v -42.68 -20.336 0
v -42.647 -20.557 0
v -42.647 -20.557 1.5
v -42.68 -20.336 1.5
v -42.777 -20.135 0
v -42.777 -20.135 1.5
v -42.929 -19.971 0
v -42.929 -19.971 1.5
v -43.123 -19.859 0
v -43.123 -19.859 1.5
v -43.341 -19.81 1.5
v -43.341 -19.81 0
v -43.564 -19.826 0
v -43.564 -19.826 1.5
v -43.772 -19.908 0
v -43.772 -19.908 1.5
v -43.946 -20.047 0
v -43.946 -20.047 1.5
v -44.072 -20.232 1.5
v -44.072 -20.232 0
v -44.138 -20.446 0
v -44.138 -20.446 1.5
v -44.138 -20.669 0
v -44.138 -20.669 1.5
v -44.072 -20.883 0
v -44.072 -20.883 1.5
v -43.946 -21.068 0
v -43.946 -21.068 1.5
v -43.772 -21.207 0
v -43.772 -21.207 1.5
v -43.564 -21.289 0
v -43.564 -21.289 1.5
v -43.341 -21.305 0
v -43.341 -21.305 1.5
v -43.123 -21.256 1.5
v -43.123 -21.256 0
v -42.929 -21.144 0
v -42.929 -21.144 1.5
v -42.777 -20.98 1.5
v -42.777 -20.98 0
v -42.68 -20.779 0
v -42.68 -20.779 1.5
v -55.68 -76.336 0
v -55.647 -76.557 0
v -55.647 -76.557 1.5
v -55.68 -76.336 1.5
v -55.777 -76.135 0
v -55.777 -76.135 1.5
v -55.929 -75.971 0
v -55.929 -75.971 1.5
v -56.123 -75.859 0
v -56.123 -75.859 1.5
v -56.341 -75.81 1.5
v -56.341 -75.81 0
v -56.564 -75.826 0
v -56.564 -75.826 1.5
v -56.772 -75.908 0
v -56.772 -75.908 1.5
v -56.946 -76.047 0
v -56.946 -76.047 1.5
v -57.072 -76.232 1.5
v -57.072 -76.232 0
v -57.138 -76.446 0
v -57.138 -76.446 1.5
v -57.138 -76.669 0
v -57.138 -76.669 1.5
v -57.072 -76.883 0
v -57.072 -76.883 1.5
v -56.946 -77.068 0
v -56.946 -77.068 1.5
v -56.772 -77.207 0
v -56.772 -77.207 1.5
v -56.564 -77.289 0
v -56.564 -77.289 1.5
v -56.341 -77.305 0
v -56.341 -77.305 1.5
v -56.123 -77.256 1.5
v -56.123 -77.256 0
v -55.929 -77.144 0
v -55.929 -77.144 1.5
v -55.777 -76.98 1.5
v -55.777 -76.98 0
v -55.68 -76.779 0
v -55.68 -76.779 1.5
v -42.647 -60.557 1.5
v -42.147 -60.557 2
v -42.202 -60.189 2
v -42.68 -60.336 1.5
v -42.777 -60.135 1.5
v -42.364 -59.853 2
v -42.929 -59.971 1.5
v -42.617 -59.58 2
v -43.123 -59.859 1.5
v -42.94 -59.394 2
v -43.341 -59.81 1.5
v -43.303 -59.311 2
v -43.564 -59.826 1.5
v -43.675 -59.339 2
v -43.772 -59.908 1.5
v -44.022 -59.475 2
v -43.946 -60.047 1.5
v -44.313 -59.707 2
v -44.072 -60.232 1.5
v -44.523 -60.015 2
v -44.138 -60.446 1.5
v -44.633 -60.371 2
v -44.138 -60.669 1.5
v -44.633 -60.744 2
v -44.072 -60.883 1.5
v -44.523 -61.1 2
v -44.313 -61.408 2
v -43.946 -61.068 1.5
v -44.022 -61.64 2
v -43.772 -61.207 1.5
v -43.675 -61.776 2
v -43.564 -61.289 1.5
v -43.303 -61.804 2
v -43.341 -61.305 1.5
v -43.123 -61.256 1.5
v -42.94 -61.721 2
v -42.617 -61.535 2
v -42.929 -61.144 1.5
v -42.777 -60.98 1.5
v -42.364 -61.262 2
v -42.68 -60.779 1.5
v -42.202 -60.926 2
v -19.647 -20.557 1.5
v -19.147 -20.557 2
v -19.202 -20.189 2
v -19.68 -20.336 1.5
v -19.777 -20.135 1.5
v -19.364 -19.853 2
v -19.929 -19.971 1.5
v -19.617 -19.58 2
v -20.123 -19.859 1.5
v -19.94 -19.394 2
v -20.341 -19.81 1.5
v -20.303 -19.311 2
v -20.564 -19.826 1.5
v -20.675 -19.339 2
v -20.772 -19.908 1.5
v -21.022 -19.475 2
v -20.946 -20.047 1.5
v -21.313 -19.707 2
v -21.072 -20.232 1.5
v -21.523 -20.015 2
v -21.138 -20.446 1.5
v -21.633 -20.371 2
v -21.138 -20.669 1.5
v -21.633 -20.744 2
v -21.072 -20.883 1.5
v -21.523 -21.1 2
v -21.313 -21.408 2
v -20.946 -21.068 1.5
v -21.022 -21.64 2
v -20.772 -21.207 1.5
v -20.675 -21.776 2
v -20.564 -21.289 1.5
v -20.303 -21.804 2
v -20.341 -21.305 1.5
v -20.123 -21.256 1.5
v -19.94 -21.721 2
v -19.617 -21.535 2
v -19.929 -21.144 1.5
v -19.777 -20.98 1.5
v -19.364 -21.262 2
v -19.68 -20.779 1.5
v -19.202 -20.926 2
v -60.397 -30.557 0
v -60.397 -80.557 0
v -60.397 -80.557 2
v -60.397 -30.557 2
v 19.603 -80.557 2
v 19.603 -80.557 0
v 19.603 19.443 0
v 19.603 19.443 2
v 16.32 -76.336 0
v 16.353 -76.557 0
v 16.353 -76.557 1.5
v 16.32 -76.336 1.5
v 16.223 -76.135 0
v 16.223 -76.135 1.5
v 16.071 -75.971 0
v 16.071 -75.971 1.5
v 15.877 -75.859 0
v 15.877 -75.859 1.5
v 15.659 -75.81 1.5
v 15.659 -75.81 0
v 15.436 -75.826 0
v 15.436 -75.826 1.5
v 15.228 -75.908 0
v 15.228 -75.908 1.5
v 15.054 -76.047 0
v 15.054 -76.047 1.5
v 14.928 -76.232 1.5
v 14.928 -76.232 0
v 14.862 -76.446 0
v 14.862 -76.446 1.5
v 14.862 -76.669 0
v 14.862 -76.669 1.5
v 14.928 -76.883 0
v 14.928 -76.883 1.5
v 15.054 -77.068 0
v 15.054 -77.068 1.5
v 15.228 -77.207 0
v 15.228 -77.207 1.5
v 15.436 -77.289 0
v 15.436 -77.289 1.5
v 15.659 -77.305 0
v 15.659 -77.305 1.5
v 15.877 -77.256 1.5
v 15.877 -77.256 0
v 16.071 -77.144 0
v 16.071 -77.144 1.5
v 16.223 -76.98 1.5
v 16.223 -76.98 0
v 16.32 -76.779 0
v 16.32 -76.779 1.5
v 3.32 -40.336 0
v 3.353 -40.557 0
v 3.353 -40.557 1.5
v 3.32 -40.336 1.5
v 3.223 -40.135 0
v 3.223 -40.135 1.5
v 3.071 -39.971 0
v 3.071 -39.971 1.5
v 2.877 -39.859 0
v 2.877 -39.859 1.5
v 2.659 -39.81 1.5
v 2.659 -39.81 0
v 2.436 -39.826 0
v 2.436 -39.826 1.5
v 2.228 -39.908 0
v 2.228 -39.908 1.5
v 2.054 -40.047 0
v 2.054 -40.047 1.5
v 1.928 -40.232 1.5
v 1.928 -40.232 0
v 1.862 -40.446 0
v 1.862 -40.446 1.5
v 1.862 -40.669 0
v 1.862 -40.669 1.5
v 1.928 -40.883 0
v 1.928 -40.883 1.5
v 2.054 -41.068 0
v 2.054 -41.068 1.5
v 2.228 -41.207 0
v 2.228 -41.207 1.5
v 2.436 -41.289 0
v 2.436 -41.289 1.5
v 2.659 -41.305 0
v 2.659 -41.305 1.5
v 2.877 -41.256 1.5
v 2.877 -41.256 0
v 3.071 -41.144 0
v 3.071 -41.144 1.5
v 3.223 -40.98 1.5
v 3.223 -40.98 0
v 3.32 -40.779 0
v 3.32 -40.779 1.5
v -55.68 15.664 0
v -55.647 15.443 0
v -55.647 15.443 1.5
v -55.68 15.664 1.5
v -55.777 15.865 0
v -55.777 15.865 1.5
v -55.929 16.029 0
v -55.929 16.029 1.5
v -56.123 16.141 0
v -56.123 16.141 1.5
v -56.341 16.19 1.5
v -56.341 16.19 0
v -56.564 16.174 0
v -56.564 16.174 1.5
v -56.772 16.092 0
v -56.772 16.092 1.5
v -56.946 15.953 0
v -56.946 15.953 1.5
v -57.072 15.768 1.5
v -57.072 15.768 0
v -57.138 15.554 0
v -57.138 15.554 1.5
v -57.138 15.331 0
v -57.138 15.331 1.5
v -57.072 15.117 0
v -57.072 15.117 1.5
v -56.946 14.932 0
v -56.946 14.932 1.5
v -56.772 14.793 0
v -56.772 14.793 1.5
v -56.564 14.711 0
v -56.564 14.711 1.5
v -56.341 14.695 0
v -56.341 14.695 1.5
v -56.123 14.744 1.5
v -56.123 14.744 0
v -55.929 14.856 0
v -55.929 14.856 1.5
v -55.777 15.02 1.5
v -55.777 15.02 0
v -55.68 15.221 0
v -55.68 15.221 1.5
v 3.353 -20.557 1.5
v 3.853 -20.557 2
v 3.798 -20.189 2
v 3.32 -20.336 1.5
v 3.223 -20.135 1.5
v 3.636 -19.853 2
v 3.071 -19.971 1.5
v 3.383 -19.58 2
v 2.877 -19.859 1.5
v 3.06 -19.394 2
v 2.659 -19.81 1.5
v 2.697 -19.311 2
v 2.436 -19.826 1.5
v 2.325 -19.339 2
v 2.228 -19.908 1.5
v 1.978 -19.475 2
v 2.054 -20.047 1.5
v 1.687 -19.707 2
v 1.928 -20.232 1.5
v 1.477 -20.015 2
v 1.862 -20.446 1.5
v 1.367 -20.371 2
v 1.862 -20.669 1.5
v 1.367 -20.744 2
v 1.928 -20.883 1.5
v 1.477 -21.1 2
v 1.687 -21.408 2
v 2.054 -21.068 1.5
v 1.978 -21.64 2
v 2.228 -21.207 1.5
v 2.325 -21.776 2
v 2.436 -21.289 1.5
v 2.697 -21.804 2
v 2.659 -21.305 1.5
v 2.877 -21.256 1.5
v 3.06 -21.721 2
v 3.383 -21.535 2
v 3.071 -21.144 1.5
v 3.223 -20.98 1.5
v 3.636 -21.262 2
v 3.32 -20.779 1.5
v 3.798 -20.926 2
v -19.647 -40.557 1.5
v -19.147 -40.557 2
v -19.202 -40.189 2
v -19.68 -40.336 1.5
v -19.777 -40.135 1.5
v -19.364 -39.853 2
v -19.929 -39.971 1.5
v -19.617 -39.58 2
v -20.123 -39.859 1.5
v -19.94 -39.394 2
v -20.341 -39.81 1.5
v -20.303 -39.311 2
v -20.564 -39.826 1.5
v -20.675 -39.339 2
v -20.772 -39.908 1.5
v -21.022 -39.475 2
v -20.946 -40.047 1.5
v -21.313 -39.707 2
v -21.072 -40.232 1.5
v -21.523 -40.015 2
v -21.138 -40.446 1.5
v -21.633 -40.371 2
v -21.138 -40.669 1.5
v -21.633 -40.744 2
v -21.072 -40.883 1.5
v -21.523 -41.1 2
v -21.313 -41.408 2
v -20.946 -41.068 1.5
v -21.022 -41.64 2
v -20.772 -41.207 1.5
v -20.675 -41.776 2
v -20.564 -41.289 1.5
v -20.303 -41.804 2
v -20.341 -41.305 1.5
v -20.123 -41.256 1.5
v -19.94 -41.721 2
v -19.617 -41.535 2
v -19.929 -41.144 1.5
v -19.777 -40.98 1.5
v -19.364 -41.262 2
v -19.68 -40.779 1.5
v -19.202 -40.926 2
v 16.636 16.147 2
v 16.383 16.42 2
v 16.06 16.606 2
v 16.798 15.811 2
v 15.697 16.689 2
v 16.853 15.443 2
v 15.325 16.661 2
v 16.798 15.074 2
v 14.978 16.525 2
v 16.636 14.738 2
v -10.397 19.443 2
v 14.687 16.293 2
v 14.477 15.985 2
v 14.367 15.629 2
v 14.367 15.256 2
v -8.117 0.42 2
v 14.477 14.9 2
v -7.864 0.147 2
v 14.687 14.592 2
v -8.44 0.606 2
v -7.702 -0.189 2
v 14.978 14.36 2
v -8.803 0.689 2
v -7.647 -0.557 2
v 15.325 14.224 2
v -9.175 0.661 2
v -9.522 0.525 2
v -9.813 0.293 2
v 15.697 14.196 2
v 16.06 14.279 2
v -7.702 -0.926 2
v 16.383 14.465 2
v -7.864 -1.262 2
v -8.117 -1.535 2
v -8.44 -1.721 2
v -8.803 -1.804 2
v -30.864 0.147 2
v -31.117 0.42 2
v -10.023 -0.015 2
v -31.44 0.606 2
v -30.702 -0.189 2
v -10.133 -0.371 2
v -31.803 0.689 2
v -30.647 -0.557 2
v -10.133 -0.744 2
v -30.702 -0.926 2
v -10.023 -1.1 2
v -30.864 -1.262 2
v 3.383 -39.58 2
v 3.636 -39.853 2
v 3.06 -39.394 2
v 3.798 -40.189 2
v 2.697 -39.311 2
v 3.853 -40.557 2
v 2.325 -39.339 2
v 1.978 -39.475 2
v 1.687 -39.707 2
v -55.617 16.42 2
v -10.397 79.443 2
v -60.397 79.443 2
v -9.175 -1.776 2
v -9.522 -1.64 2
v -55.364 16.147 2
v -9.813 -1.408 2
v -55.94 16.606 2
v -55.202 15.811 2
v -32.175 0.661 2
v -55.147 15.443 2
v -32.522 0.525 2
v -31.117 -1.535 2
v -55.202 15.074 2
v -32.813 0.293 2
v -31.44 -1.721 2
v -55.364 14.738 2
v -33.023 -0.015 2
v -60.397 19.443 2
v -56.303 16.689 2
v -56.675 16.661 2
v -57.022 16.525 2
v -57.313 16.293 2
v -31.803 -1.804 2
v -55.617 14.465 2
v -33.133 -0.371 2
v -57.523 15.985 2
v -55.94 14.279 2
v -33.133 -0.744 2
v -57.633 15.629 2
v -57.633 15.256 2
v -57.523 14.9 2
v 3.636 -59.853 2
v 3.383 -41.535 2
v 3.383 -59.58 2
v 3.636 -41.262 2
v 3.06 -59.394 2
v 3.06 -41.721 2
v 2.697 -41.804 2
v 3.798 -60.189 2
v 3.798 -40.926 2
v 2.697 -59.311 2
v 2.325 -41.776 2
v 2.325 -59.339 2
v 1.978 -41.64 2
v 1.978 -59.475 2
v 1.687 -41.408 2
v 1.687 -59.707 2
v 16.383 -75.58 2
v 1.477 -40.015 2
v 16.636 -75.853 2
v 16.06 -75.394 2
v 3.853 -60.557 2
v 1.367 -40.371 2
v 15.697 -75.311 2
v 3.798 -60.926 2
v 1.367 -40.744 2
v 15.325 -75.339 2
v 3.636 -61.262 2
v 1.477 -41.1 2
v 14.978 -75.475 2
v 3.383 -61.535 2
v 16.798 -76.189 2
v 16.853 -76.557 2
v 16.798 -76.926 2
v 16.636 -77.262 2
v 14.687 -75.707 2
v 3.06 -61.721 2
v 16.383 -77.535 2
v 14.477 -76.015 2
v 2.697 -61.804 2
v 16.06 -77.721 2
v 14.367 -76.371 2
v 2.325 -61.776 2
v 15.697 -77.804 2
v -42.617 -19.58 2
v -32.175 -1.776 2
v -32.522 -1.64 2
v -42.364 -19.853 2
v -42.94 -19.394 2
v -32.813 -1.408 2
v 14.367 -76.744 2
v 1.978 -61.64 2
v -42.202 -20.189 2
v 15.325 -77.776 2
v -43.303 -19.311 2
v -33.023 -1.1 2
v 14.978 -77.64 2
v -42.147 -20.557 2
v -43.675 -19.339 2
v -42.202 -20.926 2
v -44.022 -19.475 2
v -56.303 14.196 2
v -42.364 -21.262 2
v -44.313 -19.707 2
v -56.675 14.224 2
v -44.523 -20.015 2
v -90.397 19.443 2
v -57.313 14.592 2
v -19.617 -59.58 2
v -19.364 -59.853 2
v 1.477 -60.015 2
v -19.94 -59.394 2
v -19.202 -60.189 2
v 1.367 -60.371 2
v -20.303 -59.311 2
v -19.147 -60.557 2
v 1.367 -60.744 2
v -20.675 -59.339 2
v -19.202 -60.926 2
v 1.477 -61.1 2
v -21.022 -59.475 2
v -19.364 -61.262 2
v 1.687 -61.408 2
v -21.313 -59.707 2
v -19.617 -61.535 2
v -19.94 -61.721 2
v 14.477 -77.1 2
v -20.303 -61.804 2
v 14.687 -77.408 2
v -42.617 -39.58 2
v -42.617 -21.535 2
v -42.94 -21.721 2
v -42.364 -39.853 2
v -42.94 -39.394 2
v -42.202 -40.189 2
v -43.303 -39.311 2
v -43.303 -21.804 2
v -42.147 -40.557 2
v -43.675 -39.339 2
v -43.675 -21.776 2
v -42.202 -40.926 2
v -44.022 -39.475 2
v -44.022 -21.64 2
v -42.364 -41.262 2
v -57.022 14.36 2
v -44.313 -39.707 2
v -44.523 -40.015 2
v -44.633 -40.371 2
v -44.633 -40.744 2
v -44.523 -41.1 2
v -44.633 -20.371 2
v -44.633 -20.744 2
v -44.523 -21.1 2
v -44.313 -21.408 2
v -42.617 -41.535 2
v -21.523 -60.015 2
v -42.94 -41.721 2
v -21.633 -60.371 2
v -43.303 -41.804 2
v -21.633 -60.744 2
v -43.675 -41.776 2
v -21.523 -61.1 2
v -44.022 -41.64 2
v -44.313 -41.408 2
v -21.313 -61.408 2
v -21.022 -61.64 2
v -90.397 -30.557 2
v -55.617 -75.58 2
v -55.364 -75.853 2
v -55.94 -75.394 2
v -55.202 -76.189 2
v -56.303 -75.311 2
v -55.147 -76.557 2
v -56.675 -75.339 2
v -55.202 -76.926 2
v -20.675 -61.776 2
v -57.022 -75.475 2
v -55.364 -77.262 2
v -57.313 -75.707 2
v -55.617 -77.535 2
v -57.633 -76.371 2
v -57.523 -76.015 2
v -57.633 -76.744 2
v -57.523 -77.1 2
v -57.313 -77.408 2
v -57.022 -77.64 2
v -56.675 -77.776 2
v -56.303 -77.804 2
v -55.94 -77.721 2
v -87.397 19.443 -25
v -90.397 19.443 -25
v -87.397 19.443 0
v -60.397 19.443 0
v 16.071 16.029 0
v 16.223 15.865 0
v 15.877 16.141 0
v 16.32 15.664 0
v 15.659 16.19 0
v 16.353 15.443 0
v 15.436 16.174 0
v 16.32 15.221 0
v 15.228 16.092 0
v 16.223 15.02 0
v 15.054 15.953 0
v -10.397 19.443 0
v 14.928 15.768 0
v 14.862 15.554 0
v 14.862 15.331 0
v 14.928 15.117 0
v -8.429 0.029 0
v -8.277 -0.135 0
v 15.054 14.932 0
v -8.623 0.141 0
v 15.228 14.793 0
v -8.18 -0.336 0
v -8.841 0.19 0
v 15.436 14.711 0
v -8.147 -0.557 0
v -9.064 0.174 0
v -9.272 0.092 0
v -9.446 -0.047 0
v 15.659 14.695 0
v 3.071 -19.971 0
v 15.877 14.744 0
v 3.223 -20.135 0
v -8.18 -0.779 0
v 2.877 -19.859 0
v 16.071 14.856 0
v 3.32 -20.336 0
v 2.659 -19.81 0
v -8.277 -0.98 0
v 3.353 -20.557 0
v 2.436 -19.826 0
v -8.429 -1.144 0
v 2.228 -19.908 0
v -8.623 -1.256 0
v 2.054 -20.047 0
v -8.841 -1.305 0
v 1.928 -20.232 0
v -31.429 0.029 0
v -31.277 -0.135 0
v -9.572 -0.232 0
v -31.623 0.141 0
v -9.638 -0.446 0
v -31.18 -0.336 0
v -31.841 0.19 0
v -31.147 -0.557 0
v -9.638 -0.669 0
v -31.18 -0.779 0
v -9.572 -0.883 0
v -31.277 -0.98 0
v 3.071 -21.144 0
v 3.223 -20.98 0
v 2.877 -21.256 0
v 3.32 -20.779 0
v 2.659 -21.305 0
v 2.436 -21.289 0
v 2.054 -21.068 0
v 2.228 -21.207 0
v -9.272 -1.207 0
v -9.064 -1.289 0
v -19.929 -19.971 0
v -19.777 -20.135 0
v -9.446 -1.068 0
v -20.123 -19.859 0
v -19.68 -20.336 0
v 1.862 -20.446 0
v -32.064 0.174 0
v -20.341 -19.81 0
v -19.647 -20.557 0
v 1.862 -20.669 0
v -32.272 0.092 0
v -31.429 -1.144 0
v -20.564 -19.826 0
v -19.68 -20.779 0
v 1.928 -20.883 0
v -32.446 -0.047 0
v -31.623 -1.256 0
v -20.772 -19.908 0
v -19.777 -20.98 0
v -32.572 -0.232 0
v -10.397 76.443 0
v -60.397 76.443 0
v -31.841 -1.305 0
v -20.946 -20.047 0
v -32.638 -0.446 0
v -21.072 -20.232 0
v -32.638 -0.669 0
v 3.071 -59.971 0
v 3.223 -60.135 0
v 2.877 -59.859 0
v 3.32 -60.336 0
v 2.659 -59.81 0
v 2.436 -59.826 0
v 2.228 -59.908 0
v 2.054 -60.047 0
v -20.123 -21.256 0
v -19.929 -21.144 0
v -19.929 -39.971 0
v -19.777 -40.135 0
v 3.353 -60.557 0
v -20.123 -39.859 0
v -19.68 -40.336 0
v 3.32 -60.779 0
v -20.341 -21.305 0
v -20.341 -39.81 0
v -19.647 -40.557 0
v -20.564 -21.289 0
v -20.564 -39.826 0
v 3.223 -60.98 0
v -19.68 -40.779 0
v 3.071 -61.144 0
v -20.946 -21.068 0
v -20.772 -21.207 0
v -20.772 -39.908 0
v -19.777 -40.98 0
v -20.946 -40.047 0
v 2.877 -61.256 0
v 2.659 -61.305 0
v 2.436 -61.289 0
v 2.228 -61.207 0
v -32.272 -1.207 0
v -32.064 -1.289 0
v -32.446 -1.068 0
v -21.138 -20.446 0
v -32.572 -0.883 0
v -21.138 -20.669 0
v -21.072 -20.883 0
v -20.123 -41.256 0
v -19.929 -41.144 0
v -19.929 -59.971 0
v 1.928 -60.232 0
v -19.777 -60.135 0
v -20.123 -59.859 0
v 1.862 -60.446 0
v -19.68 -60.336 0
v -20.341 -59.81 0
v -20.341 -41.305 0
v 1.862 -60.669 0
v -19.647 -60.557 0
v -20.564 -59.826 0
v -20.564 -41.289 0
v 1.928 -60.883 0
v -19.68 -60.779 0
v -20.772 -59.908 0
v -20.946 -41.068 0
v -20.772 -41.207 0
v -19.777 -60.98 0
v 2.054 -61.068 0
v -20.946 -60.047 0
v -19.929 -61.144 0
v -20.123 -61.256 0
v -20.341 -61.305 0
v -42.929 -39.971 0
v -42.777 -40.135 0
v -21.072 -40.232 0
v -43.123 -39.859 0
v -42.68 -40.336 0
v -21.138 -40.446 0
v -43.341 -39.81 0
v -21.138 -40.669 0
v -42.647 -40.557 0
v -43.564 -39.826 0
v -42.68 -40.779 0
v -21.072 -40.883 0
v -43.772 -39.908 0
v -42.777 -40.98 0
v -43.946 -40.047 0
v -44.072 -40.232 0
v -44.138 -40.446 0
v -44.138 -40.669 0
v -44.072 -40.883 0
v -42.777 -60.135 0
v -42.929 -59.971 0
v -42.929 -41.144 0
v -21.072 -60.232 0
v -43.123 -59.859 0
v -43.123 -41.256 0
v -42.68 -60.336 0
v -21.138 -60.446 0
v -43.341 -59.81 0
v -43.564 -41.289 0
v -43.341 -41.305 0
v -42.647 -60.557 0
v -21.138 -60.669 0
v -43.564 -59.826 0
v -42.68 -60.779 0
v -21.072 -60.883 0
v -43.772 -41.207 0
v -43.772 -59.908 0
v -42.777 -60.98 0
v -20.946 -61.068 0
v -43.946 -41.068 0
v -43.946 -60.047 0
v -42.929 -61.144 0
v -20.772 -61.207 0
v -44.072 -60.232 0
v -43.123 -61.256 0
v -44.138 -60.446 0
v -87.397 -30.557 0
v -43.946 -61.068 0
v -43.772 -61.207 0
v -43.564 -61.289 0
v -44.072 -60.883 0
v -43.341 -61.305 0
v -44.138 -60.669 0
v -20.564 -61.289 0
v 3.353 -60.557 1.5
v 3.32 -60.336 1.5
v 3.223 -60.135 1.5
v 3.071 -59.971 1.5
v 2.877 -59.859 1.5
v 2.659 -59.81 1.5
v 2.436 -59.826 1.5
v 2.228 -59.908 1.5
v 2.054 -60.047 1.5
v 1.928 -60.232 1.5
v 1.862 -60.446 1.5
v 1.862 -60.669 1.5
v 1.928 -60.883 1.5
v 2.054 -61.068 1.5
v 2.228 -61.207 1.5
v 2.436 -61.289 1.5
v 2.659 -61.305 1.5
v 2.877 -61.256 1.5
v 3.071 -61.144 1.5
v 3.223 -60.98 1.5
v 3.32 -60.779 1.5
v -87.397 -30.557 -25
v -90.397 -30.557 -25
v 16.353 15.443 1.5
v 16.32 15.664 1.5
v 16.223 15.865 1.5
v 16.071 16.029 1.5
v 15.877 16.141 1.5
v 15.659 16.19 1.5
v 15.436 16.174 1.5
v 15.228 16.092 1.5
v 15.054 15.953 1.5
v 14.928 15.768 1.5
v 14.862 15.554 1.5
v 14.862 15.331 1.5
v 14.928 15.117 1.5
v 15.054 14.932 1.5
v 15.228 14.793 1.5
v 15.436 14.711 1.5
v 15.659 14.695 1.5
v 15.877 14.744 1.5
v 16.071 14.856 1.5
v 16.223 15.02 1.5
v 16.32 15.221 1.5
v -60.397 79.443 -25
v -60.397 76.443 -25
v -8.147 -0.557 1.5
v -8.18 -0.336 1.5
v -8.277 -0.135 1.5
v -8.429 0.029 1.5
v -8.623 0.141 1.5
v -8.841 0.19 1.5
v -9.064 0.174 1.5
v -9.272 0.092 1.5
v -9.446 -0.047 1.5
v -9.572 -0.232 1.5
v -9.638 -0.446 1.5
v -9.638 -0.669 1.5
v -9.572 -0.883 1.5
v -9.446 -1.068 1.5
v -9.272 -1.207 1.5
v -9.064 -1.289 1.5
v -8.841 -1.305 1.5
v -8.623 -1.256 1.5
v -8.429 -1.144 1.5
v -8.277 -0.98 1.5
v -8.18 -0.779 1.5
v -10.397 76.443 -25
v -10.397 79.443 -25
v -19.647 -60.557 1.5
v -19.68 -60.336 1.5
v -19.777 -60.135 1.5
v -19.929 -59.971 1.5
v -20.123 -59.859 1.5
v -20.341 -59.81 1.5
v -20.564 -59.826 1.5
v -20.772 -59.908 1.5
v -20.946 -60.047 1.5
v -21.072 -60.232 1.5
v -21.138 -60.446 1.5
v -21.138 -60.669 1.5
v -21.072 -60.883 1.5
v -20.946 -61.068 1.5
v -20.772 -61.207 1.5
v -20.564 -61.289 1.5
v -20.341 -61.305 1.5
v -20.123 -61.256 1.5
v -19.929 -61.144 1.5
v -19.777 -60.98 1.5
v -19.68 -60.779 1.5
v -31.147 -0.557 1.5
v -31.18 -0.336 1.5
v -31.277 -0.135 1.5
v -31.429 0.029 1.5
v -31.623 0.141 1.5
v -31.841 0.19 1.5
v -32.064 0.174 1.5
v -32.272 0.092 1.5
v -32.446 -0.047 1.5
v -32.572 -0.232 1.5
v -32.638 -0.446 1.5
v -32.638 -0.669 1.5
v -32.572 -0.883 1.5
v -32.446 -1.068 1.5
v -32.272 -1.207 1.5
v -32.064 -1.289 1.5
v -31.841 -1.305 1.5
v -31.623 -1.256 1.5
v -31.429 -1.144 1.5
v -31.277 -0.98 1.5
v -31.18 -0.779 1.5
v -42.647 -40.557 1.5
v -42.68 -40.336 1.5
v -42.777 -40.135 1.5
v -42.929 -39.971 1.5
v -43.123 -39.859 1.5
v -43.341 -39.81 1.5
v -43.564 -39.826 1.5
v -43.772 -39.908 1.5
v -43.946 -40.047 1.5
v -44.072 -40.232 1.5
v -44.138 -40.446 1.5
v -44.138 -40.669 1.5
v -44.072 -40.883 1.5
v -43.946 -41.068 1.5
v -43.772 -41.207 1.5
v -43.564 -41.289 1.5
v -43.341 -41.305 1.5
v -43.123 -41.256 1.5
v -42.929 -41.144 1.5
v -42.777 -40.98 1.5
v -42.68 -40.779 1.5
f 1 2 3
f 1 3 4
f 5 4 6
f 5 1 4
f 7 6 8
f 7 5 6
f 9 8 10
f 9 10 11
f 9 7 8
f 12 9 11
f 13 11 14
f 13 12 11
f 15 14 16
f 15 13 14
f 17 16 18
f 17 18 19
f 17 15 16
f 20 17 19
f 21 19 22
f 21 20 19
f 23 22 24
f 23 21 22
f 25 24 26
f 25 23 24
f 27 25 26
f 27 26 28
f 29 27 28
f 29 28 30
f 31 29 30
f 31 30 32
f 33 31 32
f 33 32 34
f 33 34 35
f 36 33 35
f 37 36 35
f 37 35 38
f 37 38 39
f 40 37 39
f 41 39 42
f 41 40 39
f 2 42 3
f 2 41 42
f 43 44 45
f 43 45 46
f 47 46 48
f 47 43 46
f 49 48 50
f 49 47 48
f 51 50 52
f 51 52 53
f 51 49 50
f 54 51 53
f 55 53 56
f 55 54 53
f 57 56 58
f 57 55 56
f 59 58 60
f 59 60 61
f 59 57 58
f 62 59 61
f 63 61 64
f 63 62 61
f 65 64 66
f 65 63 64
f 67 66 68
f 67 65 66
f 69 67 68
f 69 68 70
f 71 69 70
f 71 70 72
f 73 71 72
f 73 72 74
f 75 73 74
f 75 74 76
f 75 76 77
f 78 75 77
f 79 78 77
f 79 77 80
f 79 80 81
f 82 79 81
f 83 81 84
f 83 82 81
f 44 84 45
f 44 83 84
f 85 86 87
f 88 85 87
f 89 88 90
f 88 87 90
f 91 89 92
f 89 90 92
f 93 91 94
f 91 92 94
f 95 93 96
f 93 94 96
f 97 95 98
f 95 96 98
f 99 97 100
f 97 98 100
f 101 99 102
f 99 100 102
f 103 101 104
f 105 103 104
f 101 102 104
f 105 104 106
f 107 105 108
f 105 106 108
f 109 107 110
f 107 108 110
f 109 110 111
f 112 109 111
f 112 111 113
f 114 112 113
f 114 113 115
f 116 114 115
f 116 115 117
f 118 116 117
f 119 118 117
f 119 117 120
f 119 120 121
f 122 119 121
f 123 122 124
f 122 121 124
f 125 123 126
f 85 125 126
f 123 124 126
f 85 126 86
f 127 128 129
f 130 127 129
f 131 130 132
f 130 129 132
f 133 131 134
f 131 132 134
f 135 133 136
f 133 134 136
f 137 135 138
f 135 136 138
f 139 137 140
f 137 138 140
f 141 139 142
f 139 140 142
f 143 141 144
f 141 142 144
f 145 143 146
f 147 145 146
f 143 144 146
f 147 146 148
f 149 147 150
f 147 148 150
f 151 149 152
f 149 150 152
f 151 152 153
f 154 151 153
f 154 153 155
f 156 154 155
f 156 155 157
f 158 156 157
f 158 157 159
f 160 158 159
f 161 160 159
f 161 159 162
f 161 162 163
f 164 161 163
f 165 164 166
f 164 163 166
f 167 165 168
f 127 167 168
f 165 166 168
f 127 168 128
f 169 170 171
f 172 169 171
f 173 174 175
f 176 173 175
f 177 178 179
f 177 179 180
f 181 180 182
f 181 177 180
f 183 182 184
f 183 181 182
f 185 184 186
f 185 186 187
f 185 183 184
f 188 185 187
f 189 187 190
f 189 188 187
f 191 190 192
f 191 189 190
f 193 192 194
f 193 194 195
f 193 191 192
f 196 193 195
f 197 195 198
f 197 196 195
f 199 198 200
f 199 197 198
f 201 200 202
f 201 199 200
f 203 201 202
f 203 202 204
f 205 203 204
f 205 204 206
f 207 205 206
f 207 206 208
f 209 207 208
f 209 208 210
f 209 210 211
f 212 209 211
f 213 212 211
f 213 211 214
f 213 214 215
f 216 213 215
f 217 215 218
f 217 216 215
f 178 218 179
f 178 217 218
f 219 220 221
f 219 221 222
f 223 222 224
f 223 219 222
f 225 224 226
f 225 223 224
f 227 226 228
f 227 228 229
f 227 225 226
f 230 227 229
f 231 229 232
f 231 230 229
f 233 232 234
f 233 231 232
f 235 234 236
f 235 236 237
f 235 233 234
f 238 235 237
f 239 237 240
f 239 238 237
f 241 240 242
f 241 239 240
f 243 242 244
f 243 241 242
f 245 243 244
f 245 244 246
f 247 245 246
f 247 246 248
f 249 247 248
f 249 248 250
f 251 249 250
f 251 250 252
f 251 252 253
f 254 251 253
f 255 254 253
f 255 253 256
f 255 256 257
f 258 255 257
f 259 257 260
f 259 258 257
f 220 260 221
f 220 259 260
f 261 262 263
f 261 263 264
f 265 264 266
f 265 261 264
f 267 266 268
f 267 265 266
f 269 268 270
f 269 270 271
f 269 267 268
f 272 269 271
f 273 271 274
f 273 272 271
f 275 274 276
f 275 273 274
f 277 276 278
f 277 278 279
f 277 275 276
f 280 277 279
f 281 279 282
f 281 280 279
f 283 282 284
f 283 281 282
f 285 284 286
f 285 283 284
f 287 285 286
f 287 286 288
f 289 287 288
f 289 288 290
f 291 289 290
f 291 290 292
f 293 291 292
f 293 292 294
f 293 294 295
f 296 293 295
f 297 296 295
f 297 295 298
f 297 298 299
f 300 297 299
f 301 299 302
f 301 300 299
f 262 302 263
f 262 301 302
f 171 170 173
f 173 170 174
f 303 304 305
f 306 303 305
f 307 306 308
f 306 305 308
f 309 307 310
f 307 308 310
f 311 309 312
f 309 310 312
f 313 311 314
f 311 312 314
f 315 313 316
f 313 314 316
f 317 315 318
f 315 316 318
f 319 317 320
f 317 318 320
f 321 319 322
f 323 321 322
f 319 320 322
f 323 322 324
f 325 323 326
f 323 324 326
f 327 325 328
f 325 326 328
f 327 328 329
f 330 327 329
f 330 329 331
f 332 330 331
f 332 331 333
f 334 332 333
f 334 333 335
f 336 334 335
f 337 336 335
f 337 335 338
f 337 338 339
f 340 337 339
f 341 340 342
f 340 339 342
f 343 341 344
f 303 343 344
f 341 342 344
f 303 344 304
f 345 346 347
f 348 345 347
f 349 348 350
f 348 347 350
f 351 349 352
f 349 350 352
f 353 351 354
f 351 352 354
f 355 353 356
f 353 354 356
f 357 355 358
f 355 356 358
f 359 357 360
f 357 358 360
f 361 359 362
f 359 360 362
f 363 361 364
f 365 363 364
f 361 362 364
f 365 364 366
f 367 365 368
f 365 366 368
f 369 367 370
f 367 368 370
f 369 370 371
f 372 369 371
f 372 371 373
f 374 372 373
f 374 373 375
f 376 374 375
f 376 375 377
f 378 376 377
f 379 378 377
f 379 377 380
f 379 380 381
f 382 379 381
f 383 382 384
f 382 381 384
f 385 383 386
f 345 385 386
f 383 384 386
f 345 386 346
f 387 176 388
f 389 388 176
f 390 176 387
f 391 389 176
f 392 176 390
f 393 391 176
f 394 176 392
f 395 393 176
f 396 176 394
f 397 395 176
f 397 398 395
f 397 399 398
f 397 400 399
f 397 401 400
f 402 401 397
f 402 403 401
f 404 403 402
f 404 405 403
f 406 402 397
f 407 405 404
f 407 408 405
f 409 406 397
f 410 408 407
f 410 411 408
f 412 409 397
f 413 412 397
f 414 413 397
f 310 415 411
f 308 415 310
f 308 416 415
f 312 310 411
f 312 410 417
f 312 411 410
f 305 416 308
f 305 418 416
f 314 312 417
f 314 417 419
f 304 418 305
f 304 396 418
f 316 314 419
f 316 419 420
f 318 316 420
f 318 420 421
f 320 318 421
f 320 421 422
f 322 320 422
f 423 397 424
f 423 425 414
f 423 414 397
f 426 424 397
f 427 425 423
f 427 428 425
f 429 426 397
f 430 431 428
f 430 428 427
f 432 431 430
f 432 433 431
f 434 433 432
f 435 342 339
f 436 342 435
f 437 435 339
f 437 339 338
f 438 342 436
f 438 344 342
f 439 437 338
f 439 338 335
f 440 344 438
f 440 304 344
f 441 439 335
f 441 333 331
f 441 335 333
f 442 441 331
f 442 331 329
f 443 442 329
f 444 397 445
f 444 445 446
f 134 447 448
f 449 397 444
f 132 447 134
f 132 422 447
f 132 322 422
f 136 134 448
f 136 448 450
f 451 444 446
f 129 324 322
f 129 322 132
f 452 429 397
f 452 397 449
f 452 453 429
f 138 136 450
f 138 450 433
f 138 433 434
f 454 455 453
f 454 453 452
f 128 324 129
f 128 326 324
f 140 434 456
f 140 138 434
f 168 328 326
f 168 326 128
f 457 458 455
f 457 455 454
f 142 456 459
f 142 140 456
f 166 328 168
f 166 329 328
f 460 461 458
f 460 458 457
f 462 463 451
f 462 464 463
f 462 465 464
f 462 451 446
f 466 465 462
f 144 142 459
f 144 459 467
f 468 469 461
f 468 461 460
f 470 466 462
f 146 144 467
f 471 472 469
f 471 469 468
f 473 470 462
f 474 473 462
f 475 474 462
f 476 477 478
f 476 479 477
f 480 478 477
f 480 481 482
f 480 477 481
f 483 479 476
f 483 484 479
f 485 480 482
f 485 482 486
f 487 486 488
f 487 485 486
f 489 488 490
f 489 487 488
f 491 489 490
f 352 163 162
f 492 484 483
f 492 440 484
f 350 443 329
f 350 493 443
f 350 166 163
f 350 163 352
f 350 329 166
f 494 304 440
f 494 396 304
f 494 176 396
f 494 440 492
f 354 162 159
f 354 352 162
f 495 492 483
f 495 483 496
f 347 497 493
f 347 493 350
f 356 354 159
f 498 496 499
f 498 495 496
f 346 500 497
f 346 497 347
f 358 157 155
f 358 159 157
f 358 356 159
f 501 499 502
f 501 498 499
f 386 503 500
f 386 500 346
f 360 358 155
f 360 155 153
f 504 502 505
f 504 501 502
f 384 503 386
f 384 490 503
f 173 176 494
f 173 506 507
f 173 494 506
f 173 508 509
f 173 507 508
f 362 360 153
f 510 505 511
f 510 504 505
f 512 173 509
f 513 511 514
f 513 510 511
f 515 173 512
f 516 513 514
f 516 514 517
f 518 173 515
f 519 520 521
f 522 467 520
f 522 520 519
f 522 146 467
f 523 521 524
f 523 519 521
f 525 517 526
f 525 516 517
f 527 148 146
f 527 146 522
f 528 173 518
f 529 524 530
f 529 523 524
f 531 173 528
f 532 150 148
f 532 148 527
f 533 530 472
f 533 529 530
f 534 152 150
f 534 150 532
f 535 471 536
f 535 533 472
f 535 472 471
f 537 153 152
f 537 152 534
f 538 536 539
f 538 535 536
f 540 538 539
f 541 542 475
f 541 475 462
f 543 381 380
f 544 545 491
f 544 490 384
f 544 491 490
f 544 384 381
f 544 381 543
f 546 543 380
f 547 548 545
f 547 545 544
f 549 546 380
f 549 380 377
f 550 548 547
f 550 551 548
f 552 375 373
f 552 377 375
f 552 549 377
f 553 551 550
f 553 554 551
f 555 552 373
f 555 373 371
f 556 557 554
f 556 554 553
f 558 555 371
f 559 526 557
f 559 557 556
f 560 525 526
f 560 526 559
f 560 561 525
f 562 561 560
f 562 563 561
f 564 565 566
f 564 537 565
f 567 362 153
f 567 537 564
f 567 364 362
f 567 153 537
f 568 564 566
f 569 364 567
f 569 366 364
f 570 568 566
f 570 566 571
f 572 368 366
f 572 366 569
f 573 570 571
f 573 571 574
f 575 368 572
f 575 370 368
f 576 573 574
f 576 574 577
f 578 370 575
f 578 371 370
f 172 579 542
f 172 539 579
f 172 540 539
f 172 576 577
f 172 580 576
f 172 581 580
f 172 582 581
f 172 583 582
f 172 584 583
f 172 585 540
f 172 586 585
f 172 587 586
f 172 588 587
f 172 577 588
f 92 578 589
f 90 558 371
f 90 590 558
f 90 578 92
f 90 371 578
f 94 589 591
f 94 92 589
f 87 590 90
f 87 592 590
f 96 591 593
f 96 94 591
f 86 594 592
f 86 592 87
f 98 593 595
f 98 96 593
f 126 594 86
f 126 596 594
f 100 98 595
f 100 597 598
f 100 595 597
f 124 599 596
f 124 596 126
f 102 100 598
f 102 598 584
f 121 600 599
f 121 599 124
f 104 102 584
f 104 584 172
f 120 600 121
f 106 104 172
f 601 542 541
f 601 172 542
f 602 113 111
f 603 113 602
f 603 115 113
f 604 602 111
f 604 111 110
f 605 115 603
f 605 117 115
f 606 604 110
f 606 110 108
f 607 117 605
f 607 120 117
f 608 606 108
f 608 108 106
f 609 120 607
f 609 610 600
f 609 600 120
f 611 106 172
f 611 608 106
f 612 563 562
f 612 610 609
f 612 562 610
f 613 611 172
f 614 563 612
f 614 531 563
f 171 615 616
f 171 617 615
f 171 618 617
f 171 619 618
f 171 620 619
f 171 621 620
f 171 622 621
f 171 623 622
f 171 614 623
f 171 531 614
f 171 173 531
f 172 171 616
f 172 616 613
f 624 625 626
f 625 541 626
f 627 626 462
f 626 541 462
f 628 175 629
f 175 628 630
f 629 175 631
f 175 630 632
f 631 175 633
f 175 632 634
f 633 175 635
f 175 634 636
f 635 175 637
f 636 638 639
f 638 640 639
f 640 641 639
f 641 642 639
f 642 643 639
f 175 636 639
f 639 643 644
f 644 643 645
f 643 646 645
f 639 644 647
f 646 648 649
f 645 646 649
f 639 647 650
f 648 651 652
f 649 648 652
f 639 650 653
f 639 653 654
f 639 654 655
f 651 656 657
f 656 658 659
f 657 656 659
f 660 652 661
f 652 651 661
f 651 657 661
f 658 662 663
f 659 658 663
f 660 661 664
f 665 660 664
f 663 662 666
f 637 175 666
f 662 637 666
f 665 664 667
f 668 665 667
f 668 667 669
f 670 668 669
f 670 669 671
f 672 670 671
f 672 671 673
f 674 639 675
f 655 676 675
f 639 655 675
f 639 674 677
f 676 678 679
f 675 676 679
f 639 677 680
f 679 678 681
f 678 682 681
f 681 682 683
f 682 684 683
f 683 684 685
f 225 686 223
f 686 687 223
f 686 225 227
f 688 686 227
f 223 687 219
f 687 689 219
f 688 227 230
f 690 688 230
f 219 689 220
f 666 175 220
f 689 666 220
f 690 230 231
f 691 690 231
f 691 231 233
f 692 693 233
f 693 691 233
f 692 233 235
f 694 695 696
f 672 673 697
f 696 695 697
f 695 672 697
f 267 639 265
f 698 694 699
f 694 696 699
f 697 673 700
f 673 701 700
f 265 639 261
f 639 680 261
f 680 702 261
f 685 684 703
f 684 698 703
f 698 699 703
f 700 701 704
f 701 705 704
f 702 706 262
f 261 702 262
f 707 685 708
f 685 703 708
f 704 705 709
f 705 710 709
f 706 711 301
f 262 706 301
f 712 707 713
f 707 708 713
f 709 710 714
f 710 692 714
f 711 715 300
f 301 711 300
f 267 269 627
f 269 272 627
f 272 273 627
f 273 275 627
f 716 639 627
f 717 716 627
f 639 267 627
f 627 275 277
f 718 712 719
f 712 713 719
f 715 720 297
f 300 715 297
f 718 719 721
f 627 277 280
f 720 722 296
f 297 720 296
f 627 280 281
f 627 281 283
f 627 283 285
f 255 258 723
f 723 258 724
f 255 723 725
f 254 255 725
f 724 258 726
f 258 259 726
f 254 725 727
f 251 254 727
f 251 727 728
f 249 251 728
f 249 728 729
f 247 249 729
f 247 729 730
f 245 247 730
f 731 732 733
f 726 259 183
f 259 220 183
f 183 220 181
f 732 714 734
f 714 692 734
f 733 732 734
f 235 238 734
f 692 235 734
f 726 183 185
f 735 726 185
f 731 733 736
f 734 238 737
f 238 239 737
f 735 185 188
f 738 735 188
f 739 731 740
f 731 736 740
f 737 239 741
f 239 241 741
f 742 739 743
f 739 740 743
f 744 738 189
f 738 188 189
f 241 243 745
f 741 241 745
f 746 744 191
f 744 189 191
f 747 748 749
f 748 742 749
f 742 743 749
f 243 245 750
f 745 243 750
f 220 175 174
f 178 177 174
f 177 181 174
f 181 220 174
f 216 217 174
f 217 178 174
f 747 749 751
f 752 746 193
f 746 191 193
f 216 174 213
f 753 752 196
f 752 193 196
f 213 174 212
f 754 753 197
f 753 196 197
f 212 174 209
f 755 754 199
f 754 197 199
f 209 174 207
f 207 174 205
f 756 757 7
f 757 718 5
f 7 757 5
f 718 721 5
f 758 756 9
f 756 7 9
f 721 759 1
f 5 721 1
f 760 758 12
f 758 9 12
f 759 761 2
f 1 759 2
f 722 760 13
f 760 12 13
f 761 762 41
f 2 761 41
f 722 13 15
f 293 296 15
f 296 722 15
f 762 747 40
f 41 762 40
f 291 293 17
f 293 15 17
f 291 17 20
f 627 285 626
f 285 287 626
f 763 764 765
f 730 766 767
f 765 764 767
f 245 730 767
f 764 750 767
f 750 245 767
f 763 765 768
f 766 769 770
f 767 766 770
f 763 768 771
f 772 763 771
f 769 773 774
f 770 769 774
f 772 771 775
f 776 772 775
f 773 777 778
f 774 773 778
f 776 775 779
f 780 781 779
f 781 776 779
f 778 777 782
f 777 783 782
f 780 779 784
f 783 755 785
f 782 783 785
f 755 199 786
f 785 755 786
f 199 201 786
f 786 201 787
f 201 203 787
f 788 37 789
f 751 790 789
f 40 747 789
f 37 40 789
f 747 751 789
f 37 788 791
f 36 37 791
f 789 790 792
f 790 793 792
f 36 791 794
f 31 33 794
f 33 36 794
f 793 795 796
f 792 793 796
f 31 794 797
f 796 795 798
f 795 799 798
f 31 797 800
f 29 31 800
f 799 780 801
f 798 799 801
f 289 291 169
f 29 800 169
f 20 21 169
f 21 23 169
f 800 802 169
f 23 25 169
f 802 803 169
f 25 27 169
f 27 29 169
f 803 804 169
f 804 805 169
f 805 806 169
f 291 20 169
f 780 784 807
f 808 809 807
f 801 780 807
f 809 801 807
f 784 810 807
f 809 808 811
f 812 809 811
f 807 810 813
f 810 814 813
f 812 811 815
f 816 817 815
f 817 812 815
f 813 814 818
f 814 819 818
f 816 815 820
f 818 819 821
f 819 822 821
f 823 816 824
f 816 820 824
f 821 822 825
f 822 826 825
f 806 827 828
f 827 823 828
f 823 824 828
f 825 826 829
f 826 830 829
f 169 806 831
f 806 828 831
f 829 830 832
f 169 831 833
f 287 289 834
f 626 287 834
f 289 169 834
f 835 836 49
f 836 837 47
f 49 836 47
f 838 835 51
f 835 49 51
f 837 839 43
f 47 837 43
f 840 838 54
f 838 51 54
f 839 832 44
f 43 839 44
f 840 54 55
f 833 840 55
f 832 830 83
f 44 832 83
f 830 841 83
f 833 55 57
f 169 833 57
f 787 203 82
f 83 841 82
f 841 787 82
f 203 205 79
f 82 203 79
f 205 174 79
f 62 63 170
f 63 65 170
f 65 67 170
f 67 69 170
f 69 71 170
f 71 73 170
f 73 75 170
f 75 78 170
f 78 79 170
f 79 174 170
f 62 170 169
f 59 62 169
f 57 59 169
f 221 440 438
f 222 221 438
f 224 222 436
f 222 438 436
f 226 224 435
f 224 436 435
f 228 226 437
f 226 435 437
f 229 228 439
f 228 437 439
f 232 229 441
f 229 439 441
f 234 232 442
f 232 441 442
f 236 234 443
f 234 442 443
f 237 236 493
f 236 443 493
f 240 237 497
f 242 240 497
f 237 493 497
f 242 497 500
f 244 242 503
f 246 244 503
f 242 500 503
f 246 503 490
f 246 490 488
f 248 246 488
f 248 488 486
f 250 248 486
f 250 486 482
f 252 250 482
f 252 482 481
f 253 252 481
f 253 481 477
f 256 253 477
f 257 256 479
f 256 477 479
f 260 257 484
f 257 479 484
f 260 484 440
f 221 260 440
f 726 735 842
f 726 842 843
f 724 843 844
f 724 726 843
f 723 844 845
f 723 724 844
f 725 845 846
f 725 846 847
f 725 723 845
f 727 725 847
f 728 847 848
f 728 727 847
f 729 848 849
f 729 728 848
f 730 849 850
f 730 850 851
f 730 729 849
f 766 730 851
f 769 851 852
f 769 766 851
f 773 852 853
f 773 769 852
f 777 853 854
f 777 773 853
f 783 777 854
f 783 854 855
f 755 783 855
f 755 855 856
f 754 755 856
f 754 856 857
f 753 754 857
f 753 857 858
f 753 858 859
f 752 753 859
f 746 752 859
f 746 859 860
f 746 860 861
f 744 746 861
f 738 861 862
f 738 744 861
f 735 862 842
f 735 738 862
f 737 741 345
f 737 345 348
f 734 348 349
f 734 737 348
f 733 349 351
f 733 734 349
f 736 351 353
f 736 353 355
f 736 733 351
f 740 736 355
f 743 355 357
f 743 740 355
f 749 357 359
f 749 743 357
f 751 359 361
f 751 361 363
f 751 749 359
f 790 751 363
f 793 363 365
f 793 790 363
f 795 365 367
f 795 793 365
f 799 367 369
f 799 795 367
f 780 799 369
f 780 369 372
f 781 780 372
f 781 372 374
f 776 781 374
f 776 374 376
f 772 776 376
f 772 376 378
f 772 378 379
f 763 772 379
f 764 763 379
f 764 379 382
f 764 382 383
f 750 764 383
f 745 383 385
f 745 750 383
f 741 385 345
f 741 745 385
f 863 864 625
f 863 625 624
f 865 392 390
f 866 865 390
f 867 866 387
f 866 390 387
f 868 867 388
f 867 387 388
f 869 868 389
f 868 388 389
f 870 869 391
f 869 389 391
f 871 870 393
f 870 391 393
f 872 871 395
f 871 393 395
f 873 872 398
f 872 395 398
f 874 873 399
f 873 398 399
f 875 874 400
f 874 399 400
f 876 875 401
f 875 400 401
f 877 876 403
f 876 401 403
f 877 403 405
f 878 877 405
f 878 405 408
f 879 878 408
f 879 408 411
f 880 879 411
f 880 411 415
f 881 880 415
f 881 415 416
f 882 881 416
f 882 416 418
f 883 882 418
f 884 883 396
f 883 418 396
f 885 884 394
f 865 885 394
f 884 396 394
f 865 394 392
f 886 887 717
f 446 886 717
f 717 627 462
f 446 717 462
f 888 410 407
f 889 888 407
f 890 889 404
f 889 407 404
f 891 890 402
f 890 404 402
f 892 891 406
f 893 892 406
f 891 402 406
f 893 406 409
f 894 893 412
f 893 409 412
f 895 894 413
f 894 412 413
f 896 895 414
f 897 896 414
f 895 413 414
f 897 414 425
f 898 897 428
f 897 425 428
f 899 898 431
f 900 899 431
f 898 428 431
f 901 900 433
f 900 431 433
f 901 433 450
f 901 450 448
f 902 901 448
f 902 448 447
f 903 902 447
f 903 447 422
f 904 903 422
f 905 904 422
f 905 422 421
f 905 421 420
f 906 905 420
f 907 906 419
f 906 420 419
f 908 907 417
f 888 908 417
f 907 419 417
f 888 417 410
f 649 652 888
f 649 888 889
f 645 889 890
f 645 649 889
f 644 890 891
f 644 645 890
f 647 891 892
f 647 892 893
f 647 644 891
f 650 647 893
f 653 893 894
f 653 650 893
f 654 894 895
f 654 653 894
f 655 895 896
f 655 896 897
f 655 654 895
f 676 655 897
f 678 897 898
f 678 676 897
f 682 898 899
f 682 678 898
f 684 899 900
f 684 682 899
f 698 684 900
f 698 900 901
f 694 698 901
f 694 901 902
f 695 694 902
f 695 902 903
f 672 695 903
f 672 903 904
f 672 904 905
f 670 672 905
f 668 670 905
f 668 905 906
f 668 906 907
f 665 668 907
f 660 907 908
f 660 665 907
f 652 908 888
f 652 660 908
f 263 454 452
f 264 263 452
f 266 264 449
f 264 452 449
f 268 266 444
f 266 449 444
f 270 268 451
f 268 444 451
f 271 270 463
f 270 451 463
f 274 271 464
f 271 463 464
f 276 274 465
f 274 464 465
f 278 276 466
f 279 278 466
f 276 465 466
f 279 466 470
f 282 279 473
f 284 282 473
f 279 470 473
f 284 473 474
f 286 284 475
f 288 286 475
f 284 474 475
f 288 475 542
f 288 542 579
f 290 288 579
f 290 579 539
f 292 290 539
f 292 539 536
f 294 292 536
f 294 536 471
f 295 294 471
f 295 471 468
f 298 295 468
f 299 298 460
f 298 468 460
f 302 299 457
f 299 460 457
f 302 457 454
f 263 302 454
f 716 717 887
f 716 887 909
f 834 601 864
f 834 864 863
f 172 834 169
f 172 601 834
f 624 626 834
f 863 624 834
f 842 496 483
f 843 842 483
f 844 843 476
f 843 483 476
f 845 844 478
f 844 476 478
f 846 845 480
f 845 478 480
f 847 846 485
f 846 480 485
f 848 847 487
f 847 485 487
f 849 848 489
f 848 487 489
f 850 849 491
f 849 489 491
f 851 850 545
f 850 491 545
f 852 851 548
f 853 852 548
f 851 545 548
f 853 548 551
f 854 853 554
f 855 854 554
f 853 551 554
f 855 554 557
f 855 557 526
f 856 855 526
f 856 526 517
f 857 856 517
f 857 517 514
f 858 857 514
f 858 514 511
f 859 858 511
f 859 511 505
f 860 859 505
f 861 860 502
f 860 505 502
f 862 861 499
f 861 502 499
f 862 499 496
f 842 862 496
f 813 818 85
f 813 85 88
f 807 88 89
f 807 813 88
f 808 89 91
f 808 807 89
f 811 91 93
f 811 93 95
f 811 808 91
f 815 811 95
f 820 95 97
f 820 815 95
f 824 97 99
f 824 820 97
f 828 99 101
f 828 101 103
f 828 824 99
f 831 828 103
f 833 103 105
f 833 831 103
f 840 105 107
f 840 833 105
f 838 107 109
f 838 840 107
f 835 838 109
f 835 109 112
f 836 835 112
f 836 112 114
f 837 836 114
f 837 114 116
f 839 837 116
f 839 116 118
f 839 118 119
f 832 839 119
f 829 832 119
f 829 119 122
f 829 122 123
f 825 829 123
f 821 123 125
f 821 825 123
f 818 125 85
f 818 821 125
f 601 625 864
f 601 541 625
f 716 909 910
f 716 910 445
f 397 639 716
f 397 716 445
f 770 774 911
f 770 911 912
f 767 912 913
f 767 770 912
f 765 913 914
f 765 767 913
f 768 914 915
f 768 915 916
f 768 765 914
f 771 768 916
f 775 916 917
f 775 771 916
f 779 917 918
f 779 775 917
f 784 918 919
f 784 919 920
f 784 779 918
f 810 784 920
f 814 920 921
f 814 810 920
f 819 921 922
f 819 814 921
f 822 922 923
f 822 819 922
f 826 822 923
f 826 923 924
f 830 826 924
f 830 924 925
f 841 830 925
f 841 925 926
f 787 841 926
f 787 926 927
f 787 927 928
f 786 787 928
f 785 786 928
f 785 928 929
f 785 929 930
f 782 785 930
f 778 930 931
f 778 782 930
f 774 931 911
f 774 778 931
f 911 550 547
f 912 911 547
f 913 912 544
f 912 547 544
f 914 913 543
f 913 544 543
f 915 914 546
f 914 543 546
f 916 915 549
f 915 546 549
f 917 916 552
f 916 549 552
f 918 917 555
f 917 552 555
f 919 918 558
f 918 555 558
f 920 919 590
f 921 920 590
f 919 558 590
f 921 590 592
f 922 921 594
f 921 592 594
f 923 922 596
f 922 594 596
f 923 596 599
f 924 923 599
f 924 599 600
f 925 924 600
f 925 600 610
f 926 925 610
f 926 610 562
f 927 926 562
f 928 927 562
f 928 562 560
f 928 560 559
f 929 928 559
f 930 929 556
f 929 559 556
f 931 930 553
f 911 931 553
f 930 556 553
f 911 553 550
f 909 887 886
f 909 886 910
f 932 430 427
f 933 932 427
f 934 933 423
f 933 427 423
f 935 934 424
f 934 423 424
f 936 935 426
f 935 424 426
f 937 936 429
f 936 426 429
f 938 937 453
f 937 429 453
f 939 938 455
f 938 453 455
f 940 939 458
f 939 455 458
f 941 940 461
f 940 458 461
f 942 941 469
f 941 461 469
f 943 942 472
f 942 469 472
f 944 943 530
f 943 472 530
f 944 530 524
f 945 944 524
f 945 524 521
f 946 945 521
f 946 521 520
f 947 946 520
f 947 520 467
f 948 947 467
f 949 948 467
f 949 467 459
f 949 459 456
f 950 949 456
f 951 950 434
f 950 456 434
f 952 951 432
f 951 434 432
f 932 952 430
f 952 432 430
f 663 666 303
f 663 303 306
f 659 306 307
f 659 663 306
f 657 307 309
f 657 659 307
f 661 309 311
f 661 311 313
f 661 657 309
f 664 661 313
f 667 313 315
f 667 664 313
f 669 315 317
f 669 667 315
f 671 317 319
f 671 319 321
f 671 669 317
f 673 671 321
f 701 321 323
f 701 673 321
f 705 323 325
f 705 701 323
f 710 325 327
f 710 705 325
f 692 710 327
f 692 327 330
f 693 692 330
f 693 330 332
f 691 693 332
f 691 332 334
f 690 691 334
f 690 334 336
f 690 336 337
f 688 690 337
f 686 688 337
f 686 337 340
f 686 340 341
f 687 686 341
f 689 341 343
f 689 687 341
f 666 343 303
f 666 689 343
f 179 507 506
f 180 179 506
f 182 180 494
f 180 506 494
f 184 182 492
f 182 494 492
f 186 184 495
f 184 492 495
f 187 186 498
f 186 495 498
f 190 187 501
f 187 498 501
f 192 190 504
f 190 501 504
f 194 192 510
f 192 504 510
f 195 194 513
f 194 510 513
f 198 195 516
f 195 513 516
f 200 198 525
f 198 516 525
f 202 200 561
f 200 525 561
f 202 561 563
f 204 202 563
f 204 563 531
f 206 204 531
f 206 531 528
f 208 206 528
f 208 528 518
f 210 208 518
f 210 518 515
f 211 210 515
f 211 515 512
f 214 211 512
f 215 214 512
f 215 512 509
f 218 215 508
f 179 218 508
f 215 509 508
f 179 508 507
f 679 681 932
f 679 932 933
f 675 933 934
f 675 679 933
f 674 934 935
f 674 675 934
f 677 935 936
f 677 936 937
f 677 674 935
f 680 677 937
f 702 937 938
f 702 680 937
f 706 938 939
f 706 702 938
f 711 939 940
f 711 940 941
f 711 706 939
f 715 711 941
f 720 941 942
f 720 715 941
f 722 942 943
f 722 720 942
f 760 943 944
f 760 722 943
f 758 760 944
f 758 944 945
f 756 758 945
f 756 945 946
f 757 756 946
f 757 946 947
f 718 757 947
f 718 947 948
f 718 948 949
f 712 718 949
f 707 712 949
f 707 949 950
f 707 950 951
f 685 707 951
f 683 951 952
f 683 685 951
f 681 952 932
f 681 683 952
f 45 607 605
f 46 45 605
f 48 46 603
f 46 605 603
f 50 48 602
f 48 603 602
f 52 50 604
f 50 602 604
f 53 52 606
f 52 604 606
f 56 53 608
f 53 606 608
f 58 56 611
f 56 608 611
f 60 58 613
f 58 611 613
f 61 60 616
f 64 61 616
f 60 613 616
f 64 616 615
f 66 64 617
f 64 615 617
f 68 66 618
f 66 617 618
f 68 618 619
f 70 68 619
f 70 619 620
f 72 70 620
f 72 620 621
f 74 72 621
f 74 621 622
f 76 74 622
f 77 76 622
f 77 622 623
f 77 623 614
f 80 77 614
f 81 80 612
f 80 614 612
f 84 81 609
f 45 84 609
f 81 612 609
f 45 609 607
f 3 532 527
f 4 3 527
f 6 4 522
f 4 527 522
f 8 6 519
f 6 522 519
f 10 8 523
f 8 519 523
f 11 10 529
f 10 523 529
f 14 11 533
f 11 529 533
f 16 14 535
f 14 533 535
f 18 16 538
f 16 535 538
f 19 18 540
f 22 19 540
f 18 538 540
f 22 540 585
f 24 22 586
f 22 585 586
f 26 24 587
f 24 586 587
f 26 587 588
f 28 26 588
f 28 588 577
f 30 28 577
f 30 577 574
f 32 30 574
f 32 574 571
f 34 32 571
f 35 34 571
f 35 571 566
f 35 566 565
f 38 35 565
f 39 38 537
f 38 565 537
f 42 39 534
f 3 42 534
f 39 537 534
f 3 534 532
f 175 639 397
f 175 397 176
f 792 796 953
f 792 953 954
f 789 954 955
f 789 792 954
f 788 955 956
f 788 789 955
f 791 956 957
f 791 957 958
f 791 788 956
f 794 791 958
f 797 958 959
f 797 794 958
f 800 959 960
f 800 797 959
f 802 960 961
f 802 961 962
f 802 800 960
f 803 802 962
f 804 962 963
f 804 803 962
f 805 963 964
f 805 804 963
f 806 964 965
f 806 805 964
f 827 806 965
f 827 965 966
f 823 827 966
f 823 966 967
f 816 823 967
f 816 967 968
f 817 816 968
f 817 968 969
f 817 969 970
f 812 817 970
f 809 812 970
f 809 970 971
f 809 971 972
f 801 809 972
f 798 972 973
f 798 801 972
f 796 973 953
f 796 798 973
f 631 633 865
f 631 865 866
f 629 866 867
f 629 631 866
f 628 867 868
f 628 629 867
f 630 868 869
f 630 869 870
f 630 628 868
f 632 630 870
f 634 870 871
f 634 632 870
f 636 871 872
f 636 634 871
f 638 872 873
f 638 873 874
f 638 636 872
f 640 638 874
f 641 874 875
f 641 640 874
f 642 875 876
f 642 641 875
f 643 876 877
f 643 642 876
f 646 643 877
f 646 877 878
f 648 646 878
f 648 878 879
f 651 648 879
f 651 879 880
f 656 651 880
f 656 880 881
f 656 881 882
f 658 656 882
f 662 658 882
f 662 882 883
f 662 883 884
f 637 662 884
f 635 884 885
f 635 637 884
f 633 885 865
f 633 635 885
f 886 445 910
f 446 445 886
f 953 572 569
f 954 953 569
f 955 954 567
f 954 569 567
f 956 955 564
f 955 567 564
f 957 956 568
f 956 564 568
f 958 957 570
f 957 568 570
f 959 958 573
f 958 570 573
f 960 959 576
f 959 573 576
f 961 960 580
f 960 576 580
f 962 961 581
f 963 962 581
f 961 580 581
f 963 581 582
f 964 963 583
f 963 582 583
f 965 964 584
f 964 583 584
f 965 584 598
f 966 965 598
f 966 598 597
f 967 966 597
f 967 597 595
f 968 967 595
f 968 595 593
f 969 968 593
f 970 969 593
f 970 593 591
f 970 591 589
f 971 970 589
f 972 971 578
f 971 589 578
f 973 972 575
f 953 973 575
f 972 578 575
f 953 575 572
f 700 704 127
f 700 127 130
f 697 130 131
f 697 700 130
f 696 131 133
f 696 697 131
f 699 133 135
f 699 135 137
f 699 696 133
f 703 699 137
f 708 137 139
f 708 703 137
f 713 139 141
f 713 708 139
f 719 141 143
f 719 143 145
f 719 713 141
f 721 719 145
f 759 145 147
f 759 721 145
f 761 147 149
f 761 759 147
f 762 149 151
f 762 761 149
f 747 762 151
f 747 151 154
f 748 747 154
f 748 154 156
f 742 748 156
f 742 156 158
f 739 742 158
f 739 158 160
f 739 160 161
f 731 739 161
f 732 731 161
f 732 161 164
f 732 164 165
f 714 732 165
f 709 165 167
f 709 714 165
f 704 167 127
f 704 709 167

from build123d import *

# Parameters (mm, degrees)
F0_W     = 80
F0_H     = 100
F0_R     = 0.75
F1_DEPTH = 2
F3_W     = 50
F3_H     = 2
F4_DEPTH = 60
F2_W     = 50
F2_H     = 2
F5_DEPTH = 30
F6_W     = 3
F6_H     = 50
F6_W_2   = 50
F6_H_2   = 3
F7_DEPTH = 25
F8_SIZE  = 0.5


with BuildPart() as f1:
    # F0 (on Top) → F1 (new body)
    with BuildSketch(Plane.XY):
        with Locations((-20.396638, -30.557484)):
            Rectangle(F0_W, F0_H)
        with Locations((-56.396638, -76.557484)):
            Circle(F0_R, mode=Mode.SUBTRACT)
        with Locations((-43.396638, -60.557484)):
            Circle(F0_R, mode=Mode.SUBTRACT)
        with Locations((-43.396638, -40.557484)):
            Circle(F0_R, mode=Mode.SUBTRACT)
        with Locations((-20.396638, -60.557484)):
            Circle(F0_R, mode=Mode.SUBTRACT)
        with Locations((15.603362, -76.557484)):
            Circle(F0_R, mode=Mode.SUBTRACT)
        with Locations((2.603362, -60.557484)):
            Circle(F0_R, mode=Mode.SUBTRACT)
        with Locations((-20.396638, -40.557484)):
            Circle(F0_R, mode=Mode.SUBTRACT)
        with Locations((2.603362, -40.557484)):
            Circle(F0_R, mode=Mode.SUBTRACT)
        with Locations((-43.396638, -20.557484)):
            Circle(F0_R, mode=Mode.SUBTRACT)
        with Locations((-56.396638, 15.442516)):
            Circle(F0_R, mode=Mode.SUBTRACT)
        with Locations((-31.896638, -0.557484)):
            Circle(F0_R, mode=Mode.SUBTRACT)
        with Locations((-20.396638, -20.557484)):
            Circle(F0_R, mode=Mode.SUBTRACT)
        with Locations((2.603362, -20.557484)):
            Circle(F0_R, mode=Mode.SUBTRACT)
        with Locations((-8.896638, -0.557484)):
            Circle(F0_R, mode=Mode.SUBTRACT)
        with Locations((15.603362, 15.442516)):
            Circle(F0_R, mode=Mode.SUBTRACT)
    extrude(amount=F1_DEPTH)

    # F3 (on face) → F4 (join)
    with BuildSketch(Plane(origin=(0, 19.442516, 0), x_dir=(-1, 0, 0), z_dir=(0, 1, 0))):
        with Locations((35.396638, 1)):
            Rectangle(F3_W, F3_H)
    extrude(amount=F4_DEPTH)

    # F2 (on face) → F5 (join)
    with BuildSketch(Plane(origin=(-60.396638, 0, 0), x_dir=(0, -1, 0), z_dir=(-1, 0, 0))):
        with Locations((5.557484, 1)):
            Rectangle(F2_W, F2_H)
    extrude(amount=F5_DEPTH)

    # F6 (on face) → F7 (join)
    with BuildSketch(Plane(origin=(0, 0, 0), x_dir=(1, 0, 0), z_dir=(0, 0, -1))):
        with Locations((-88.896638, 5.557484)):
            Rectangle(F6_W, F6_H)
        with Locations((-35.396638, -77.942516)):
            Rectangle(F6_W_2, F6_H_2)
    extrude(amount=F7_DEPTH)

    # F8
    f8_edges = [f1.edges().sort_by_distance(p)[0] for p in [
        (-57.146638, -76.557484, 2),
        (-44.146638, -60.557484, 2),
        (-44.146638, -40.557484, 2),
        (-44.146638, -20.557484, 2),
        (-32.646638, -0.557484, 2),
        (-21.146638, -20.557484, 2),
        (-21.146638, -40.557484, 2),
        (-21.146638, -60.557484, 2),
        (14.853362, -76.557484, 2),
        (1.853362, -60.557484, 2),
        (1.853362, -40.557484, 2),
        (1.853362, -20.557484, 2),
        (-9.646638, -0.557484, 2),
        (14.853362, 15.442516, 2),
        (-57.146638, 15.442516, 2),
    ]]
    chamfer(f8_edges, length=F8_SIZE)


solid = f1.part
